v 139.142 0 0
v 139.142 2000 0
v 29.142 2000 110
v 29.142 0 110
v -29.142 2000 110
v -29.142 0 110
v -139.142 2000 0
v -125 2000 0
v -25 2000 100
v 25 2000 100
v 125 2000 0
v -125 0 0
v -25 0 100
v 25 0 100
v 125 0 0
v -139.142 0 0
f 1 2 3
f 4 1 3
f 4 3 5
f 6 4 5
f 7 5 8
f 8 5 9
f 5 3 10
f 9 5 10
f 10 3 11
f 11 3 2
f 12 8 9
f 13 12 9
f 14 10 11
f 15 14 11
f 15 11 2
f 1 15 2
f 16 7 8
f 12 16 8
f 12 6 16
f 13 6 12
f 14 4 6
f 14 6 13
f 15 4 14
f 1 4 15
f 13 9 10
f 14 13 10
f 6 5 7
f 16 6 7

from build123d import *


with BuildPart() as f2:
    # F2: sweep along a path in F1
    with BuildLine(Plane.XY) as f2_path:
        Line((0, 0), (0, 2000))
    # F0 (on Front) → F2 (sweep)
    with BuildSketch(Plane.XZ):
        Polygon((125, 0), (139.142136, 0), (29.142136, 110), (-29.142136, 110), (-139.142136, 0), (-125, 0), (-25, 100), (25, 100), align=None)
    sweep(path=f2_path.line)


solid = f2.part
